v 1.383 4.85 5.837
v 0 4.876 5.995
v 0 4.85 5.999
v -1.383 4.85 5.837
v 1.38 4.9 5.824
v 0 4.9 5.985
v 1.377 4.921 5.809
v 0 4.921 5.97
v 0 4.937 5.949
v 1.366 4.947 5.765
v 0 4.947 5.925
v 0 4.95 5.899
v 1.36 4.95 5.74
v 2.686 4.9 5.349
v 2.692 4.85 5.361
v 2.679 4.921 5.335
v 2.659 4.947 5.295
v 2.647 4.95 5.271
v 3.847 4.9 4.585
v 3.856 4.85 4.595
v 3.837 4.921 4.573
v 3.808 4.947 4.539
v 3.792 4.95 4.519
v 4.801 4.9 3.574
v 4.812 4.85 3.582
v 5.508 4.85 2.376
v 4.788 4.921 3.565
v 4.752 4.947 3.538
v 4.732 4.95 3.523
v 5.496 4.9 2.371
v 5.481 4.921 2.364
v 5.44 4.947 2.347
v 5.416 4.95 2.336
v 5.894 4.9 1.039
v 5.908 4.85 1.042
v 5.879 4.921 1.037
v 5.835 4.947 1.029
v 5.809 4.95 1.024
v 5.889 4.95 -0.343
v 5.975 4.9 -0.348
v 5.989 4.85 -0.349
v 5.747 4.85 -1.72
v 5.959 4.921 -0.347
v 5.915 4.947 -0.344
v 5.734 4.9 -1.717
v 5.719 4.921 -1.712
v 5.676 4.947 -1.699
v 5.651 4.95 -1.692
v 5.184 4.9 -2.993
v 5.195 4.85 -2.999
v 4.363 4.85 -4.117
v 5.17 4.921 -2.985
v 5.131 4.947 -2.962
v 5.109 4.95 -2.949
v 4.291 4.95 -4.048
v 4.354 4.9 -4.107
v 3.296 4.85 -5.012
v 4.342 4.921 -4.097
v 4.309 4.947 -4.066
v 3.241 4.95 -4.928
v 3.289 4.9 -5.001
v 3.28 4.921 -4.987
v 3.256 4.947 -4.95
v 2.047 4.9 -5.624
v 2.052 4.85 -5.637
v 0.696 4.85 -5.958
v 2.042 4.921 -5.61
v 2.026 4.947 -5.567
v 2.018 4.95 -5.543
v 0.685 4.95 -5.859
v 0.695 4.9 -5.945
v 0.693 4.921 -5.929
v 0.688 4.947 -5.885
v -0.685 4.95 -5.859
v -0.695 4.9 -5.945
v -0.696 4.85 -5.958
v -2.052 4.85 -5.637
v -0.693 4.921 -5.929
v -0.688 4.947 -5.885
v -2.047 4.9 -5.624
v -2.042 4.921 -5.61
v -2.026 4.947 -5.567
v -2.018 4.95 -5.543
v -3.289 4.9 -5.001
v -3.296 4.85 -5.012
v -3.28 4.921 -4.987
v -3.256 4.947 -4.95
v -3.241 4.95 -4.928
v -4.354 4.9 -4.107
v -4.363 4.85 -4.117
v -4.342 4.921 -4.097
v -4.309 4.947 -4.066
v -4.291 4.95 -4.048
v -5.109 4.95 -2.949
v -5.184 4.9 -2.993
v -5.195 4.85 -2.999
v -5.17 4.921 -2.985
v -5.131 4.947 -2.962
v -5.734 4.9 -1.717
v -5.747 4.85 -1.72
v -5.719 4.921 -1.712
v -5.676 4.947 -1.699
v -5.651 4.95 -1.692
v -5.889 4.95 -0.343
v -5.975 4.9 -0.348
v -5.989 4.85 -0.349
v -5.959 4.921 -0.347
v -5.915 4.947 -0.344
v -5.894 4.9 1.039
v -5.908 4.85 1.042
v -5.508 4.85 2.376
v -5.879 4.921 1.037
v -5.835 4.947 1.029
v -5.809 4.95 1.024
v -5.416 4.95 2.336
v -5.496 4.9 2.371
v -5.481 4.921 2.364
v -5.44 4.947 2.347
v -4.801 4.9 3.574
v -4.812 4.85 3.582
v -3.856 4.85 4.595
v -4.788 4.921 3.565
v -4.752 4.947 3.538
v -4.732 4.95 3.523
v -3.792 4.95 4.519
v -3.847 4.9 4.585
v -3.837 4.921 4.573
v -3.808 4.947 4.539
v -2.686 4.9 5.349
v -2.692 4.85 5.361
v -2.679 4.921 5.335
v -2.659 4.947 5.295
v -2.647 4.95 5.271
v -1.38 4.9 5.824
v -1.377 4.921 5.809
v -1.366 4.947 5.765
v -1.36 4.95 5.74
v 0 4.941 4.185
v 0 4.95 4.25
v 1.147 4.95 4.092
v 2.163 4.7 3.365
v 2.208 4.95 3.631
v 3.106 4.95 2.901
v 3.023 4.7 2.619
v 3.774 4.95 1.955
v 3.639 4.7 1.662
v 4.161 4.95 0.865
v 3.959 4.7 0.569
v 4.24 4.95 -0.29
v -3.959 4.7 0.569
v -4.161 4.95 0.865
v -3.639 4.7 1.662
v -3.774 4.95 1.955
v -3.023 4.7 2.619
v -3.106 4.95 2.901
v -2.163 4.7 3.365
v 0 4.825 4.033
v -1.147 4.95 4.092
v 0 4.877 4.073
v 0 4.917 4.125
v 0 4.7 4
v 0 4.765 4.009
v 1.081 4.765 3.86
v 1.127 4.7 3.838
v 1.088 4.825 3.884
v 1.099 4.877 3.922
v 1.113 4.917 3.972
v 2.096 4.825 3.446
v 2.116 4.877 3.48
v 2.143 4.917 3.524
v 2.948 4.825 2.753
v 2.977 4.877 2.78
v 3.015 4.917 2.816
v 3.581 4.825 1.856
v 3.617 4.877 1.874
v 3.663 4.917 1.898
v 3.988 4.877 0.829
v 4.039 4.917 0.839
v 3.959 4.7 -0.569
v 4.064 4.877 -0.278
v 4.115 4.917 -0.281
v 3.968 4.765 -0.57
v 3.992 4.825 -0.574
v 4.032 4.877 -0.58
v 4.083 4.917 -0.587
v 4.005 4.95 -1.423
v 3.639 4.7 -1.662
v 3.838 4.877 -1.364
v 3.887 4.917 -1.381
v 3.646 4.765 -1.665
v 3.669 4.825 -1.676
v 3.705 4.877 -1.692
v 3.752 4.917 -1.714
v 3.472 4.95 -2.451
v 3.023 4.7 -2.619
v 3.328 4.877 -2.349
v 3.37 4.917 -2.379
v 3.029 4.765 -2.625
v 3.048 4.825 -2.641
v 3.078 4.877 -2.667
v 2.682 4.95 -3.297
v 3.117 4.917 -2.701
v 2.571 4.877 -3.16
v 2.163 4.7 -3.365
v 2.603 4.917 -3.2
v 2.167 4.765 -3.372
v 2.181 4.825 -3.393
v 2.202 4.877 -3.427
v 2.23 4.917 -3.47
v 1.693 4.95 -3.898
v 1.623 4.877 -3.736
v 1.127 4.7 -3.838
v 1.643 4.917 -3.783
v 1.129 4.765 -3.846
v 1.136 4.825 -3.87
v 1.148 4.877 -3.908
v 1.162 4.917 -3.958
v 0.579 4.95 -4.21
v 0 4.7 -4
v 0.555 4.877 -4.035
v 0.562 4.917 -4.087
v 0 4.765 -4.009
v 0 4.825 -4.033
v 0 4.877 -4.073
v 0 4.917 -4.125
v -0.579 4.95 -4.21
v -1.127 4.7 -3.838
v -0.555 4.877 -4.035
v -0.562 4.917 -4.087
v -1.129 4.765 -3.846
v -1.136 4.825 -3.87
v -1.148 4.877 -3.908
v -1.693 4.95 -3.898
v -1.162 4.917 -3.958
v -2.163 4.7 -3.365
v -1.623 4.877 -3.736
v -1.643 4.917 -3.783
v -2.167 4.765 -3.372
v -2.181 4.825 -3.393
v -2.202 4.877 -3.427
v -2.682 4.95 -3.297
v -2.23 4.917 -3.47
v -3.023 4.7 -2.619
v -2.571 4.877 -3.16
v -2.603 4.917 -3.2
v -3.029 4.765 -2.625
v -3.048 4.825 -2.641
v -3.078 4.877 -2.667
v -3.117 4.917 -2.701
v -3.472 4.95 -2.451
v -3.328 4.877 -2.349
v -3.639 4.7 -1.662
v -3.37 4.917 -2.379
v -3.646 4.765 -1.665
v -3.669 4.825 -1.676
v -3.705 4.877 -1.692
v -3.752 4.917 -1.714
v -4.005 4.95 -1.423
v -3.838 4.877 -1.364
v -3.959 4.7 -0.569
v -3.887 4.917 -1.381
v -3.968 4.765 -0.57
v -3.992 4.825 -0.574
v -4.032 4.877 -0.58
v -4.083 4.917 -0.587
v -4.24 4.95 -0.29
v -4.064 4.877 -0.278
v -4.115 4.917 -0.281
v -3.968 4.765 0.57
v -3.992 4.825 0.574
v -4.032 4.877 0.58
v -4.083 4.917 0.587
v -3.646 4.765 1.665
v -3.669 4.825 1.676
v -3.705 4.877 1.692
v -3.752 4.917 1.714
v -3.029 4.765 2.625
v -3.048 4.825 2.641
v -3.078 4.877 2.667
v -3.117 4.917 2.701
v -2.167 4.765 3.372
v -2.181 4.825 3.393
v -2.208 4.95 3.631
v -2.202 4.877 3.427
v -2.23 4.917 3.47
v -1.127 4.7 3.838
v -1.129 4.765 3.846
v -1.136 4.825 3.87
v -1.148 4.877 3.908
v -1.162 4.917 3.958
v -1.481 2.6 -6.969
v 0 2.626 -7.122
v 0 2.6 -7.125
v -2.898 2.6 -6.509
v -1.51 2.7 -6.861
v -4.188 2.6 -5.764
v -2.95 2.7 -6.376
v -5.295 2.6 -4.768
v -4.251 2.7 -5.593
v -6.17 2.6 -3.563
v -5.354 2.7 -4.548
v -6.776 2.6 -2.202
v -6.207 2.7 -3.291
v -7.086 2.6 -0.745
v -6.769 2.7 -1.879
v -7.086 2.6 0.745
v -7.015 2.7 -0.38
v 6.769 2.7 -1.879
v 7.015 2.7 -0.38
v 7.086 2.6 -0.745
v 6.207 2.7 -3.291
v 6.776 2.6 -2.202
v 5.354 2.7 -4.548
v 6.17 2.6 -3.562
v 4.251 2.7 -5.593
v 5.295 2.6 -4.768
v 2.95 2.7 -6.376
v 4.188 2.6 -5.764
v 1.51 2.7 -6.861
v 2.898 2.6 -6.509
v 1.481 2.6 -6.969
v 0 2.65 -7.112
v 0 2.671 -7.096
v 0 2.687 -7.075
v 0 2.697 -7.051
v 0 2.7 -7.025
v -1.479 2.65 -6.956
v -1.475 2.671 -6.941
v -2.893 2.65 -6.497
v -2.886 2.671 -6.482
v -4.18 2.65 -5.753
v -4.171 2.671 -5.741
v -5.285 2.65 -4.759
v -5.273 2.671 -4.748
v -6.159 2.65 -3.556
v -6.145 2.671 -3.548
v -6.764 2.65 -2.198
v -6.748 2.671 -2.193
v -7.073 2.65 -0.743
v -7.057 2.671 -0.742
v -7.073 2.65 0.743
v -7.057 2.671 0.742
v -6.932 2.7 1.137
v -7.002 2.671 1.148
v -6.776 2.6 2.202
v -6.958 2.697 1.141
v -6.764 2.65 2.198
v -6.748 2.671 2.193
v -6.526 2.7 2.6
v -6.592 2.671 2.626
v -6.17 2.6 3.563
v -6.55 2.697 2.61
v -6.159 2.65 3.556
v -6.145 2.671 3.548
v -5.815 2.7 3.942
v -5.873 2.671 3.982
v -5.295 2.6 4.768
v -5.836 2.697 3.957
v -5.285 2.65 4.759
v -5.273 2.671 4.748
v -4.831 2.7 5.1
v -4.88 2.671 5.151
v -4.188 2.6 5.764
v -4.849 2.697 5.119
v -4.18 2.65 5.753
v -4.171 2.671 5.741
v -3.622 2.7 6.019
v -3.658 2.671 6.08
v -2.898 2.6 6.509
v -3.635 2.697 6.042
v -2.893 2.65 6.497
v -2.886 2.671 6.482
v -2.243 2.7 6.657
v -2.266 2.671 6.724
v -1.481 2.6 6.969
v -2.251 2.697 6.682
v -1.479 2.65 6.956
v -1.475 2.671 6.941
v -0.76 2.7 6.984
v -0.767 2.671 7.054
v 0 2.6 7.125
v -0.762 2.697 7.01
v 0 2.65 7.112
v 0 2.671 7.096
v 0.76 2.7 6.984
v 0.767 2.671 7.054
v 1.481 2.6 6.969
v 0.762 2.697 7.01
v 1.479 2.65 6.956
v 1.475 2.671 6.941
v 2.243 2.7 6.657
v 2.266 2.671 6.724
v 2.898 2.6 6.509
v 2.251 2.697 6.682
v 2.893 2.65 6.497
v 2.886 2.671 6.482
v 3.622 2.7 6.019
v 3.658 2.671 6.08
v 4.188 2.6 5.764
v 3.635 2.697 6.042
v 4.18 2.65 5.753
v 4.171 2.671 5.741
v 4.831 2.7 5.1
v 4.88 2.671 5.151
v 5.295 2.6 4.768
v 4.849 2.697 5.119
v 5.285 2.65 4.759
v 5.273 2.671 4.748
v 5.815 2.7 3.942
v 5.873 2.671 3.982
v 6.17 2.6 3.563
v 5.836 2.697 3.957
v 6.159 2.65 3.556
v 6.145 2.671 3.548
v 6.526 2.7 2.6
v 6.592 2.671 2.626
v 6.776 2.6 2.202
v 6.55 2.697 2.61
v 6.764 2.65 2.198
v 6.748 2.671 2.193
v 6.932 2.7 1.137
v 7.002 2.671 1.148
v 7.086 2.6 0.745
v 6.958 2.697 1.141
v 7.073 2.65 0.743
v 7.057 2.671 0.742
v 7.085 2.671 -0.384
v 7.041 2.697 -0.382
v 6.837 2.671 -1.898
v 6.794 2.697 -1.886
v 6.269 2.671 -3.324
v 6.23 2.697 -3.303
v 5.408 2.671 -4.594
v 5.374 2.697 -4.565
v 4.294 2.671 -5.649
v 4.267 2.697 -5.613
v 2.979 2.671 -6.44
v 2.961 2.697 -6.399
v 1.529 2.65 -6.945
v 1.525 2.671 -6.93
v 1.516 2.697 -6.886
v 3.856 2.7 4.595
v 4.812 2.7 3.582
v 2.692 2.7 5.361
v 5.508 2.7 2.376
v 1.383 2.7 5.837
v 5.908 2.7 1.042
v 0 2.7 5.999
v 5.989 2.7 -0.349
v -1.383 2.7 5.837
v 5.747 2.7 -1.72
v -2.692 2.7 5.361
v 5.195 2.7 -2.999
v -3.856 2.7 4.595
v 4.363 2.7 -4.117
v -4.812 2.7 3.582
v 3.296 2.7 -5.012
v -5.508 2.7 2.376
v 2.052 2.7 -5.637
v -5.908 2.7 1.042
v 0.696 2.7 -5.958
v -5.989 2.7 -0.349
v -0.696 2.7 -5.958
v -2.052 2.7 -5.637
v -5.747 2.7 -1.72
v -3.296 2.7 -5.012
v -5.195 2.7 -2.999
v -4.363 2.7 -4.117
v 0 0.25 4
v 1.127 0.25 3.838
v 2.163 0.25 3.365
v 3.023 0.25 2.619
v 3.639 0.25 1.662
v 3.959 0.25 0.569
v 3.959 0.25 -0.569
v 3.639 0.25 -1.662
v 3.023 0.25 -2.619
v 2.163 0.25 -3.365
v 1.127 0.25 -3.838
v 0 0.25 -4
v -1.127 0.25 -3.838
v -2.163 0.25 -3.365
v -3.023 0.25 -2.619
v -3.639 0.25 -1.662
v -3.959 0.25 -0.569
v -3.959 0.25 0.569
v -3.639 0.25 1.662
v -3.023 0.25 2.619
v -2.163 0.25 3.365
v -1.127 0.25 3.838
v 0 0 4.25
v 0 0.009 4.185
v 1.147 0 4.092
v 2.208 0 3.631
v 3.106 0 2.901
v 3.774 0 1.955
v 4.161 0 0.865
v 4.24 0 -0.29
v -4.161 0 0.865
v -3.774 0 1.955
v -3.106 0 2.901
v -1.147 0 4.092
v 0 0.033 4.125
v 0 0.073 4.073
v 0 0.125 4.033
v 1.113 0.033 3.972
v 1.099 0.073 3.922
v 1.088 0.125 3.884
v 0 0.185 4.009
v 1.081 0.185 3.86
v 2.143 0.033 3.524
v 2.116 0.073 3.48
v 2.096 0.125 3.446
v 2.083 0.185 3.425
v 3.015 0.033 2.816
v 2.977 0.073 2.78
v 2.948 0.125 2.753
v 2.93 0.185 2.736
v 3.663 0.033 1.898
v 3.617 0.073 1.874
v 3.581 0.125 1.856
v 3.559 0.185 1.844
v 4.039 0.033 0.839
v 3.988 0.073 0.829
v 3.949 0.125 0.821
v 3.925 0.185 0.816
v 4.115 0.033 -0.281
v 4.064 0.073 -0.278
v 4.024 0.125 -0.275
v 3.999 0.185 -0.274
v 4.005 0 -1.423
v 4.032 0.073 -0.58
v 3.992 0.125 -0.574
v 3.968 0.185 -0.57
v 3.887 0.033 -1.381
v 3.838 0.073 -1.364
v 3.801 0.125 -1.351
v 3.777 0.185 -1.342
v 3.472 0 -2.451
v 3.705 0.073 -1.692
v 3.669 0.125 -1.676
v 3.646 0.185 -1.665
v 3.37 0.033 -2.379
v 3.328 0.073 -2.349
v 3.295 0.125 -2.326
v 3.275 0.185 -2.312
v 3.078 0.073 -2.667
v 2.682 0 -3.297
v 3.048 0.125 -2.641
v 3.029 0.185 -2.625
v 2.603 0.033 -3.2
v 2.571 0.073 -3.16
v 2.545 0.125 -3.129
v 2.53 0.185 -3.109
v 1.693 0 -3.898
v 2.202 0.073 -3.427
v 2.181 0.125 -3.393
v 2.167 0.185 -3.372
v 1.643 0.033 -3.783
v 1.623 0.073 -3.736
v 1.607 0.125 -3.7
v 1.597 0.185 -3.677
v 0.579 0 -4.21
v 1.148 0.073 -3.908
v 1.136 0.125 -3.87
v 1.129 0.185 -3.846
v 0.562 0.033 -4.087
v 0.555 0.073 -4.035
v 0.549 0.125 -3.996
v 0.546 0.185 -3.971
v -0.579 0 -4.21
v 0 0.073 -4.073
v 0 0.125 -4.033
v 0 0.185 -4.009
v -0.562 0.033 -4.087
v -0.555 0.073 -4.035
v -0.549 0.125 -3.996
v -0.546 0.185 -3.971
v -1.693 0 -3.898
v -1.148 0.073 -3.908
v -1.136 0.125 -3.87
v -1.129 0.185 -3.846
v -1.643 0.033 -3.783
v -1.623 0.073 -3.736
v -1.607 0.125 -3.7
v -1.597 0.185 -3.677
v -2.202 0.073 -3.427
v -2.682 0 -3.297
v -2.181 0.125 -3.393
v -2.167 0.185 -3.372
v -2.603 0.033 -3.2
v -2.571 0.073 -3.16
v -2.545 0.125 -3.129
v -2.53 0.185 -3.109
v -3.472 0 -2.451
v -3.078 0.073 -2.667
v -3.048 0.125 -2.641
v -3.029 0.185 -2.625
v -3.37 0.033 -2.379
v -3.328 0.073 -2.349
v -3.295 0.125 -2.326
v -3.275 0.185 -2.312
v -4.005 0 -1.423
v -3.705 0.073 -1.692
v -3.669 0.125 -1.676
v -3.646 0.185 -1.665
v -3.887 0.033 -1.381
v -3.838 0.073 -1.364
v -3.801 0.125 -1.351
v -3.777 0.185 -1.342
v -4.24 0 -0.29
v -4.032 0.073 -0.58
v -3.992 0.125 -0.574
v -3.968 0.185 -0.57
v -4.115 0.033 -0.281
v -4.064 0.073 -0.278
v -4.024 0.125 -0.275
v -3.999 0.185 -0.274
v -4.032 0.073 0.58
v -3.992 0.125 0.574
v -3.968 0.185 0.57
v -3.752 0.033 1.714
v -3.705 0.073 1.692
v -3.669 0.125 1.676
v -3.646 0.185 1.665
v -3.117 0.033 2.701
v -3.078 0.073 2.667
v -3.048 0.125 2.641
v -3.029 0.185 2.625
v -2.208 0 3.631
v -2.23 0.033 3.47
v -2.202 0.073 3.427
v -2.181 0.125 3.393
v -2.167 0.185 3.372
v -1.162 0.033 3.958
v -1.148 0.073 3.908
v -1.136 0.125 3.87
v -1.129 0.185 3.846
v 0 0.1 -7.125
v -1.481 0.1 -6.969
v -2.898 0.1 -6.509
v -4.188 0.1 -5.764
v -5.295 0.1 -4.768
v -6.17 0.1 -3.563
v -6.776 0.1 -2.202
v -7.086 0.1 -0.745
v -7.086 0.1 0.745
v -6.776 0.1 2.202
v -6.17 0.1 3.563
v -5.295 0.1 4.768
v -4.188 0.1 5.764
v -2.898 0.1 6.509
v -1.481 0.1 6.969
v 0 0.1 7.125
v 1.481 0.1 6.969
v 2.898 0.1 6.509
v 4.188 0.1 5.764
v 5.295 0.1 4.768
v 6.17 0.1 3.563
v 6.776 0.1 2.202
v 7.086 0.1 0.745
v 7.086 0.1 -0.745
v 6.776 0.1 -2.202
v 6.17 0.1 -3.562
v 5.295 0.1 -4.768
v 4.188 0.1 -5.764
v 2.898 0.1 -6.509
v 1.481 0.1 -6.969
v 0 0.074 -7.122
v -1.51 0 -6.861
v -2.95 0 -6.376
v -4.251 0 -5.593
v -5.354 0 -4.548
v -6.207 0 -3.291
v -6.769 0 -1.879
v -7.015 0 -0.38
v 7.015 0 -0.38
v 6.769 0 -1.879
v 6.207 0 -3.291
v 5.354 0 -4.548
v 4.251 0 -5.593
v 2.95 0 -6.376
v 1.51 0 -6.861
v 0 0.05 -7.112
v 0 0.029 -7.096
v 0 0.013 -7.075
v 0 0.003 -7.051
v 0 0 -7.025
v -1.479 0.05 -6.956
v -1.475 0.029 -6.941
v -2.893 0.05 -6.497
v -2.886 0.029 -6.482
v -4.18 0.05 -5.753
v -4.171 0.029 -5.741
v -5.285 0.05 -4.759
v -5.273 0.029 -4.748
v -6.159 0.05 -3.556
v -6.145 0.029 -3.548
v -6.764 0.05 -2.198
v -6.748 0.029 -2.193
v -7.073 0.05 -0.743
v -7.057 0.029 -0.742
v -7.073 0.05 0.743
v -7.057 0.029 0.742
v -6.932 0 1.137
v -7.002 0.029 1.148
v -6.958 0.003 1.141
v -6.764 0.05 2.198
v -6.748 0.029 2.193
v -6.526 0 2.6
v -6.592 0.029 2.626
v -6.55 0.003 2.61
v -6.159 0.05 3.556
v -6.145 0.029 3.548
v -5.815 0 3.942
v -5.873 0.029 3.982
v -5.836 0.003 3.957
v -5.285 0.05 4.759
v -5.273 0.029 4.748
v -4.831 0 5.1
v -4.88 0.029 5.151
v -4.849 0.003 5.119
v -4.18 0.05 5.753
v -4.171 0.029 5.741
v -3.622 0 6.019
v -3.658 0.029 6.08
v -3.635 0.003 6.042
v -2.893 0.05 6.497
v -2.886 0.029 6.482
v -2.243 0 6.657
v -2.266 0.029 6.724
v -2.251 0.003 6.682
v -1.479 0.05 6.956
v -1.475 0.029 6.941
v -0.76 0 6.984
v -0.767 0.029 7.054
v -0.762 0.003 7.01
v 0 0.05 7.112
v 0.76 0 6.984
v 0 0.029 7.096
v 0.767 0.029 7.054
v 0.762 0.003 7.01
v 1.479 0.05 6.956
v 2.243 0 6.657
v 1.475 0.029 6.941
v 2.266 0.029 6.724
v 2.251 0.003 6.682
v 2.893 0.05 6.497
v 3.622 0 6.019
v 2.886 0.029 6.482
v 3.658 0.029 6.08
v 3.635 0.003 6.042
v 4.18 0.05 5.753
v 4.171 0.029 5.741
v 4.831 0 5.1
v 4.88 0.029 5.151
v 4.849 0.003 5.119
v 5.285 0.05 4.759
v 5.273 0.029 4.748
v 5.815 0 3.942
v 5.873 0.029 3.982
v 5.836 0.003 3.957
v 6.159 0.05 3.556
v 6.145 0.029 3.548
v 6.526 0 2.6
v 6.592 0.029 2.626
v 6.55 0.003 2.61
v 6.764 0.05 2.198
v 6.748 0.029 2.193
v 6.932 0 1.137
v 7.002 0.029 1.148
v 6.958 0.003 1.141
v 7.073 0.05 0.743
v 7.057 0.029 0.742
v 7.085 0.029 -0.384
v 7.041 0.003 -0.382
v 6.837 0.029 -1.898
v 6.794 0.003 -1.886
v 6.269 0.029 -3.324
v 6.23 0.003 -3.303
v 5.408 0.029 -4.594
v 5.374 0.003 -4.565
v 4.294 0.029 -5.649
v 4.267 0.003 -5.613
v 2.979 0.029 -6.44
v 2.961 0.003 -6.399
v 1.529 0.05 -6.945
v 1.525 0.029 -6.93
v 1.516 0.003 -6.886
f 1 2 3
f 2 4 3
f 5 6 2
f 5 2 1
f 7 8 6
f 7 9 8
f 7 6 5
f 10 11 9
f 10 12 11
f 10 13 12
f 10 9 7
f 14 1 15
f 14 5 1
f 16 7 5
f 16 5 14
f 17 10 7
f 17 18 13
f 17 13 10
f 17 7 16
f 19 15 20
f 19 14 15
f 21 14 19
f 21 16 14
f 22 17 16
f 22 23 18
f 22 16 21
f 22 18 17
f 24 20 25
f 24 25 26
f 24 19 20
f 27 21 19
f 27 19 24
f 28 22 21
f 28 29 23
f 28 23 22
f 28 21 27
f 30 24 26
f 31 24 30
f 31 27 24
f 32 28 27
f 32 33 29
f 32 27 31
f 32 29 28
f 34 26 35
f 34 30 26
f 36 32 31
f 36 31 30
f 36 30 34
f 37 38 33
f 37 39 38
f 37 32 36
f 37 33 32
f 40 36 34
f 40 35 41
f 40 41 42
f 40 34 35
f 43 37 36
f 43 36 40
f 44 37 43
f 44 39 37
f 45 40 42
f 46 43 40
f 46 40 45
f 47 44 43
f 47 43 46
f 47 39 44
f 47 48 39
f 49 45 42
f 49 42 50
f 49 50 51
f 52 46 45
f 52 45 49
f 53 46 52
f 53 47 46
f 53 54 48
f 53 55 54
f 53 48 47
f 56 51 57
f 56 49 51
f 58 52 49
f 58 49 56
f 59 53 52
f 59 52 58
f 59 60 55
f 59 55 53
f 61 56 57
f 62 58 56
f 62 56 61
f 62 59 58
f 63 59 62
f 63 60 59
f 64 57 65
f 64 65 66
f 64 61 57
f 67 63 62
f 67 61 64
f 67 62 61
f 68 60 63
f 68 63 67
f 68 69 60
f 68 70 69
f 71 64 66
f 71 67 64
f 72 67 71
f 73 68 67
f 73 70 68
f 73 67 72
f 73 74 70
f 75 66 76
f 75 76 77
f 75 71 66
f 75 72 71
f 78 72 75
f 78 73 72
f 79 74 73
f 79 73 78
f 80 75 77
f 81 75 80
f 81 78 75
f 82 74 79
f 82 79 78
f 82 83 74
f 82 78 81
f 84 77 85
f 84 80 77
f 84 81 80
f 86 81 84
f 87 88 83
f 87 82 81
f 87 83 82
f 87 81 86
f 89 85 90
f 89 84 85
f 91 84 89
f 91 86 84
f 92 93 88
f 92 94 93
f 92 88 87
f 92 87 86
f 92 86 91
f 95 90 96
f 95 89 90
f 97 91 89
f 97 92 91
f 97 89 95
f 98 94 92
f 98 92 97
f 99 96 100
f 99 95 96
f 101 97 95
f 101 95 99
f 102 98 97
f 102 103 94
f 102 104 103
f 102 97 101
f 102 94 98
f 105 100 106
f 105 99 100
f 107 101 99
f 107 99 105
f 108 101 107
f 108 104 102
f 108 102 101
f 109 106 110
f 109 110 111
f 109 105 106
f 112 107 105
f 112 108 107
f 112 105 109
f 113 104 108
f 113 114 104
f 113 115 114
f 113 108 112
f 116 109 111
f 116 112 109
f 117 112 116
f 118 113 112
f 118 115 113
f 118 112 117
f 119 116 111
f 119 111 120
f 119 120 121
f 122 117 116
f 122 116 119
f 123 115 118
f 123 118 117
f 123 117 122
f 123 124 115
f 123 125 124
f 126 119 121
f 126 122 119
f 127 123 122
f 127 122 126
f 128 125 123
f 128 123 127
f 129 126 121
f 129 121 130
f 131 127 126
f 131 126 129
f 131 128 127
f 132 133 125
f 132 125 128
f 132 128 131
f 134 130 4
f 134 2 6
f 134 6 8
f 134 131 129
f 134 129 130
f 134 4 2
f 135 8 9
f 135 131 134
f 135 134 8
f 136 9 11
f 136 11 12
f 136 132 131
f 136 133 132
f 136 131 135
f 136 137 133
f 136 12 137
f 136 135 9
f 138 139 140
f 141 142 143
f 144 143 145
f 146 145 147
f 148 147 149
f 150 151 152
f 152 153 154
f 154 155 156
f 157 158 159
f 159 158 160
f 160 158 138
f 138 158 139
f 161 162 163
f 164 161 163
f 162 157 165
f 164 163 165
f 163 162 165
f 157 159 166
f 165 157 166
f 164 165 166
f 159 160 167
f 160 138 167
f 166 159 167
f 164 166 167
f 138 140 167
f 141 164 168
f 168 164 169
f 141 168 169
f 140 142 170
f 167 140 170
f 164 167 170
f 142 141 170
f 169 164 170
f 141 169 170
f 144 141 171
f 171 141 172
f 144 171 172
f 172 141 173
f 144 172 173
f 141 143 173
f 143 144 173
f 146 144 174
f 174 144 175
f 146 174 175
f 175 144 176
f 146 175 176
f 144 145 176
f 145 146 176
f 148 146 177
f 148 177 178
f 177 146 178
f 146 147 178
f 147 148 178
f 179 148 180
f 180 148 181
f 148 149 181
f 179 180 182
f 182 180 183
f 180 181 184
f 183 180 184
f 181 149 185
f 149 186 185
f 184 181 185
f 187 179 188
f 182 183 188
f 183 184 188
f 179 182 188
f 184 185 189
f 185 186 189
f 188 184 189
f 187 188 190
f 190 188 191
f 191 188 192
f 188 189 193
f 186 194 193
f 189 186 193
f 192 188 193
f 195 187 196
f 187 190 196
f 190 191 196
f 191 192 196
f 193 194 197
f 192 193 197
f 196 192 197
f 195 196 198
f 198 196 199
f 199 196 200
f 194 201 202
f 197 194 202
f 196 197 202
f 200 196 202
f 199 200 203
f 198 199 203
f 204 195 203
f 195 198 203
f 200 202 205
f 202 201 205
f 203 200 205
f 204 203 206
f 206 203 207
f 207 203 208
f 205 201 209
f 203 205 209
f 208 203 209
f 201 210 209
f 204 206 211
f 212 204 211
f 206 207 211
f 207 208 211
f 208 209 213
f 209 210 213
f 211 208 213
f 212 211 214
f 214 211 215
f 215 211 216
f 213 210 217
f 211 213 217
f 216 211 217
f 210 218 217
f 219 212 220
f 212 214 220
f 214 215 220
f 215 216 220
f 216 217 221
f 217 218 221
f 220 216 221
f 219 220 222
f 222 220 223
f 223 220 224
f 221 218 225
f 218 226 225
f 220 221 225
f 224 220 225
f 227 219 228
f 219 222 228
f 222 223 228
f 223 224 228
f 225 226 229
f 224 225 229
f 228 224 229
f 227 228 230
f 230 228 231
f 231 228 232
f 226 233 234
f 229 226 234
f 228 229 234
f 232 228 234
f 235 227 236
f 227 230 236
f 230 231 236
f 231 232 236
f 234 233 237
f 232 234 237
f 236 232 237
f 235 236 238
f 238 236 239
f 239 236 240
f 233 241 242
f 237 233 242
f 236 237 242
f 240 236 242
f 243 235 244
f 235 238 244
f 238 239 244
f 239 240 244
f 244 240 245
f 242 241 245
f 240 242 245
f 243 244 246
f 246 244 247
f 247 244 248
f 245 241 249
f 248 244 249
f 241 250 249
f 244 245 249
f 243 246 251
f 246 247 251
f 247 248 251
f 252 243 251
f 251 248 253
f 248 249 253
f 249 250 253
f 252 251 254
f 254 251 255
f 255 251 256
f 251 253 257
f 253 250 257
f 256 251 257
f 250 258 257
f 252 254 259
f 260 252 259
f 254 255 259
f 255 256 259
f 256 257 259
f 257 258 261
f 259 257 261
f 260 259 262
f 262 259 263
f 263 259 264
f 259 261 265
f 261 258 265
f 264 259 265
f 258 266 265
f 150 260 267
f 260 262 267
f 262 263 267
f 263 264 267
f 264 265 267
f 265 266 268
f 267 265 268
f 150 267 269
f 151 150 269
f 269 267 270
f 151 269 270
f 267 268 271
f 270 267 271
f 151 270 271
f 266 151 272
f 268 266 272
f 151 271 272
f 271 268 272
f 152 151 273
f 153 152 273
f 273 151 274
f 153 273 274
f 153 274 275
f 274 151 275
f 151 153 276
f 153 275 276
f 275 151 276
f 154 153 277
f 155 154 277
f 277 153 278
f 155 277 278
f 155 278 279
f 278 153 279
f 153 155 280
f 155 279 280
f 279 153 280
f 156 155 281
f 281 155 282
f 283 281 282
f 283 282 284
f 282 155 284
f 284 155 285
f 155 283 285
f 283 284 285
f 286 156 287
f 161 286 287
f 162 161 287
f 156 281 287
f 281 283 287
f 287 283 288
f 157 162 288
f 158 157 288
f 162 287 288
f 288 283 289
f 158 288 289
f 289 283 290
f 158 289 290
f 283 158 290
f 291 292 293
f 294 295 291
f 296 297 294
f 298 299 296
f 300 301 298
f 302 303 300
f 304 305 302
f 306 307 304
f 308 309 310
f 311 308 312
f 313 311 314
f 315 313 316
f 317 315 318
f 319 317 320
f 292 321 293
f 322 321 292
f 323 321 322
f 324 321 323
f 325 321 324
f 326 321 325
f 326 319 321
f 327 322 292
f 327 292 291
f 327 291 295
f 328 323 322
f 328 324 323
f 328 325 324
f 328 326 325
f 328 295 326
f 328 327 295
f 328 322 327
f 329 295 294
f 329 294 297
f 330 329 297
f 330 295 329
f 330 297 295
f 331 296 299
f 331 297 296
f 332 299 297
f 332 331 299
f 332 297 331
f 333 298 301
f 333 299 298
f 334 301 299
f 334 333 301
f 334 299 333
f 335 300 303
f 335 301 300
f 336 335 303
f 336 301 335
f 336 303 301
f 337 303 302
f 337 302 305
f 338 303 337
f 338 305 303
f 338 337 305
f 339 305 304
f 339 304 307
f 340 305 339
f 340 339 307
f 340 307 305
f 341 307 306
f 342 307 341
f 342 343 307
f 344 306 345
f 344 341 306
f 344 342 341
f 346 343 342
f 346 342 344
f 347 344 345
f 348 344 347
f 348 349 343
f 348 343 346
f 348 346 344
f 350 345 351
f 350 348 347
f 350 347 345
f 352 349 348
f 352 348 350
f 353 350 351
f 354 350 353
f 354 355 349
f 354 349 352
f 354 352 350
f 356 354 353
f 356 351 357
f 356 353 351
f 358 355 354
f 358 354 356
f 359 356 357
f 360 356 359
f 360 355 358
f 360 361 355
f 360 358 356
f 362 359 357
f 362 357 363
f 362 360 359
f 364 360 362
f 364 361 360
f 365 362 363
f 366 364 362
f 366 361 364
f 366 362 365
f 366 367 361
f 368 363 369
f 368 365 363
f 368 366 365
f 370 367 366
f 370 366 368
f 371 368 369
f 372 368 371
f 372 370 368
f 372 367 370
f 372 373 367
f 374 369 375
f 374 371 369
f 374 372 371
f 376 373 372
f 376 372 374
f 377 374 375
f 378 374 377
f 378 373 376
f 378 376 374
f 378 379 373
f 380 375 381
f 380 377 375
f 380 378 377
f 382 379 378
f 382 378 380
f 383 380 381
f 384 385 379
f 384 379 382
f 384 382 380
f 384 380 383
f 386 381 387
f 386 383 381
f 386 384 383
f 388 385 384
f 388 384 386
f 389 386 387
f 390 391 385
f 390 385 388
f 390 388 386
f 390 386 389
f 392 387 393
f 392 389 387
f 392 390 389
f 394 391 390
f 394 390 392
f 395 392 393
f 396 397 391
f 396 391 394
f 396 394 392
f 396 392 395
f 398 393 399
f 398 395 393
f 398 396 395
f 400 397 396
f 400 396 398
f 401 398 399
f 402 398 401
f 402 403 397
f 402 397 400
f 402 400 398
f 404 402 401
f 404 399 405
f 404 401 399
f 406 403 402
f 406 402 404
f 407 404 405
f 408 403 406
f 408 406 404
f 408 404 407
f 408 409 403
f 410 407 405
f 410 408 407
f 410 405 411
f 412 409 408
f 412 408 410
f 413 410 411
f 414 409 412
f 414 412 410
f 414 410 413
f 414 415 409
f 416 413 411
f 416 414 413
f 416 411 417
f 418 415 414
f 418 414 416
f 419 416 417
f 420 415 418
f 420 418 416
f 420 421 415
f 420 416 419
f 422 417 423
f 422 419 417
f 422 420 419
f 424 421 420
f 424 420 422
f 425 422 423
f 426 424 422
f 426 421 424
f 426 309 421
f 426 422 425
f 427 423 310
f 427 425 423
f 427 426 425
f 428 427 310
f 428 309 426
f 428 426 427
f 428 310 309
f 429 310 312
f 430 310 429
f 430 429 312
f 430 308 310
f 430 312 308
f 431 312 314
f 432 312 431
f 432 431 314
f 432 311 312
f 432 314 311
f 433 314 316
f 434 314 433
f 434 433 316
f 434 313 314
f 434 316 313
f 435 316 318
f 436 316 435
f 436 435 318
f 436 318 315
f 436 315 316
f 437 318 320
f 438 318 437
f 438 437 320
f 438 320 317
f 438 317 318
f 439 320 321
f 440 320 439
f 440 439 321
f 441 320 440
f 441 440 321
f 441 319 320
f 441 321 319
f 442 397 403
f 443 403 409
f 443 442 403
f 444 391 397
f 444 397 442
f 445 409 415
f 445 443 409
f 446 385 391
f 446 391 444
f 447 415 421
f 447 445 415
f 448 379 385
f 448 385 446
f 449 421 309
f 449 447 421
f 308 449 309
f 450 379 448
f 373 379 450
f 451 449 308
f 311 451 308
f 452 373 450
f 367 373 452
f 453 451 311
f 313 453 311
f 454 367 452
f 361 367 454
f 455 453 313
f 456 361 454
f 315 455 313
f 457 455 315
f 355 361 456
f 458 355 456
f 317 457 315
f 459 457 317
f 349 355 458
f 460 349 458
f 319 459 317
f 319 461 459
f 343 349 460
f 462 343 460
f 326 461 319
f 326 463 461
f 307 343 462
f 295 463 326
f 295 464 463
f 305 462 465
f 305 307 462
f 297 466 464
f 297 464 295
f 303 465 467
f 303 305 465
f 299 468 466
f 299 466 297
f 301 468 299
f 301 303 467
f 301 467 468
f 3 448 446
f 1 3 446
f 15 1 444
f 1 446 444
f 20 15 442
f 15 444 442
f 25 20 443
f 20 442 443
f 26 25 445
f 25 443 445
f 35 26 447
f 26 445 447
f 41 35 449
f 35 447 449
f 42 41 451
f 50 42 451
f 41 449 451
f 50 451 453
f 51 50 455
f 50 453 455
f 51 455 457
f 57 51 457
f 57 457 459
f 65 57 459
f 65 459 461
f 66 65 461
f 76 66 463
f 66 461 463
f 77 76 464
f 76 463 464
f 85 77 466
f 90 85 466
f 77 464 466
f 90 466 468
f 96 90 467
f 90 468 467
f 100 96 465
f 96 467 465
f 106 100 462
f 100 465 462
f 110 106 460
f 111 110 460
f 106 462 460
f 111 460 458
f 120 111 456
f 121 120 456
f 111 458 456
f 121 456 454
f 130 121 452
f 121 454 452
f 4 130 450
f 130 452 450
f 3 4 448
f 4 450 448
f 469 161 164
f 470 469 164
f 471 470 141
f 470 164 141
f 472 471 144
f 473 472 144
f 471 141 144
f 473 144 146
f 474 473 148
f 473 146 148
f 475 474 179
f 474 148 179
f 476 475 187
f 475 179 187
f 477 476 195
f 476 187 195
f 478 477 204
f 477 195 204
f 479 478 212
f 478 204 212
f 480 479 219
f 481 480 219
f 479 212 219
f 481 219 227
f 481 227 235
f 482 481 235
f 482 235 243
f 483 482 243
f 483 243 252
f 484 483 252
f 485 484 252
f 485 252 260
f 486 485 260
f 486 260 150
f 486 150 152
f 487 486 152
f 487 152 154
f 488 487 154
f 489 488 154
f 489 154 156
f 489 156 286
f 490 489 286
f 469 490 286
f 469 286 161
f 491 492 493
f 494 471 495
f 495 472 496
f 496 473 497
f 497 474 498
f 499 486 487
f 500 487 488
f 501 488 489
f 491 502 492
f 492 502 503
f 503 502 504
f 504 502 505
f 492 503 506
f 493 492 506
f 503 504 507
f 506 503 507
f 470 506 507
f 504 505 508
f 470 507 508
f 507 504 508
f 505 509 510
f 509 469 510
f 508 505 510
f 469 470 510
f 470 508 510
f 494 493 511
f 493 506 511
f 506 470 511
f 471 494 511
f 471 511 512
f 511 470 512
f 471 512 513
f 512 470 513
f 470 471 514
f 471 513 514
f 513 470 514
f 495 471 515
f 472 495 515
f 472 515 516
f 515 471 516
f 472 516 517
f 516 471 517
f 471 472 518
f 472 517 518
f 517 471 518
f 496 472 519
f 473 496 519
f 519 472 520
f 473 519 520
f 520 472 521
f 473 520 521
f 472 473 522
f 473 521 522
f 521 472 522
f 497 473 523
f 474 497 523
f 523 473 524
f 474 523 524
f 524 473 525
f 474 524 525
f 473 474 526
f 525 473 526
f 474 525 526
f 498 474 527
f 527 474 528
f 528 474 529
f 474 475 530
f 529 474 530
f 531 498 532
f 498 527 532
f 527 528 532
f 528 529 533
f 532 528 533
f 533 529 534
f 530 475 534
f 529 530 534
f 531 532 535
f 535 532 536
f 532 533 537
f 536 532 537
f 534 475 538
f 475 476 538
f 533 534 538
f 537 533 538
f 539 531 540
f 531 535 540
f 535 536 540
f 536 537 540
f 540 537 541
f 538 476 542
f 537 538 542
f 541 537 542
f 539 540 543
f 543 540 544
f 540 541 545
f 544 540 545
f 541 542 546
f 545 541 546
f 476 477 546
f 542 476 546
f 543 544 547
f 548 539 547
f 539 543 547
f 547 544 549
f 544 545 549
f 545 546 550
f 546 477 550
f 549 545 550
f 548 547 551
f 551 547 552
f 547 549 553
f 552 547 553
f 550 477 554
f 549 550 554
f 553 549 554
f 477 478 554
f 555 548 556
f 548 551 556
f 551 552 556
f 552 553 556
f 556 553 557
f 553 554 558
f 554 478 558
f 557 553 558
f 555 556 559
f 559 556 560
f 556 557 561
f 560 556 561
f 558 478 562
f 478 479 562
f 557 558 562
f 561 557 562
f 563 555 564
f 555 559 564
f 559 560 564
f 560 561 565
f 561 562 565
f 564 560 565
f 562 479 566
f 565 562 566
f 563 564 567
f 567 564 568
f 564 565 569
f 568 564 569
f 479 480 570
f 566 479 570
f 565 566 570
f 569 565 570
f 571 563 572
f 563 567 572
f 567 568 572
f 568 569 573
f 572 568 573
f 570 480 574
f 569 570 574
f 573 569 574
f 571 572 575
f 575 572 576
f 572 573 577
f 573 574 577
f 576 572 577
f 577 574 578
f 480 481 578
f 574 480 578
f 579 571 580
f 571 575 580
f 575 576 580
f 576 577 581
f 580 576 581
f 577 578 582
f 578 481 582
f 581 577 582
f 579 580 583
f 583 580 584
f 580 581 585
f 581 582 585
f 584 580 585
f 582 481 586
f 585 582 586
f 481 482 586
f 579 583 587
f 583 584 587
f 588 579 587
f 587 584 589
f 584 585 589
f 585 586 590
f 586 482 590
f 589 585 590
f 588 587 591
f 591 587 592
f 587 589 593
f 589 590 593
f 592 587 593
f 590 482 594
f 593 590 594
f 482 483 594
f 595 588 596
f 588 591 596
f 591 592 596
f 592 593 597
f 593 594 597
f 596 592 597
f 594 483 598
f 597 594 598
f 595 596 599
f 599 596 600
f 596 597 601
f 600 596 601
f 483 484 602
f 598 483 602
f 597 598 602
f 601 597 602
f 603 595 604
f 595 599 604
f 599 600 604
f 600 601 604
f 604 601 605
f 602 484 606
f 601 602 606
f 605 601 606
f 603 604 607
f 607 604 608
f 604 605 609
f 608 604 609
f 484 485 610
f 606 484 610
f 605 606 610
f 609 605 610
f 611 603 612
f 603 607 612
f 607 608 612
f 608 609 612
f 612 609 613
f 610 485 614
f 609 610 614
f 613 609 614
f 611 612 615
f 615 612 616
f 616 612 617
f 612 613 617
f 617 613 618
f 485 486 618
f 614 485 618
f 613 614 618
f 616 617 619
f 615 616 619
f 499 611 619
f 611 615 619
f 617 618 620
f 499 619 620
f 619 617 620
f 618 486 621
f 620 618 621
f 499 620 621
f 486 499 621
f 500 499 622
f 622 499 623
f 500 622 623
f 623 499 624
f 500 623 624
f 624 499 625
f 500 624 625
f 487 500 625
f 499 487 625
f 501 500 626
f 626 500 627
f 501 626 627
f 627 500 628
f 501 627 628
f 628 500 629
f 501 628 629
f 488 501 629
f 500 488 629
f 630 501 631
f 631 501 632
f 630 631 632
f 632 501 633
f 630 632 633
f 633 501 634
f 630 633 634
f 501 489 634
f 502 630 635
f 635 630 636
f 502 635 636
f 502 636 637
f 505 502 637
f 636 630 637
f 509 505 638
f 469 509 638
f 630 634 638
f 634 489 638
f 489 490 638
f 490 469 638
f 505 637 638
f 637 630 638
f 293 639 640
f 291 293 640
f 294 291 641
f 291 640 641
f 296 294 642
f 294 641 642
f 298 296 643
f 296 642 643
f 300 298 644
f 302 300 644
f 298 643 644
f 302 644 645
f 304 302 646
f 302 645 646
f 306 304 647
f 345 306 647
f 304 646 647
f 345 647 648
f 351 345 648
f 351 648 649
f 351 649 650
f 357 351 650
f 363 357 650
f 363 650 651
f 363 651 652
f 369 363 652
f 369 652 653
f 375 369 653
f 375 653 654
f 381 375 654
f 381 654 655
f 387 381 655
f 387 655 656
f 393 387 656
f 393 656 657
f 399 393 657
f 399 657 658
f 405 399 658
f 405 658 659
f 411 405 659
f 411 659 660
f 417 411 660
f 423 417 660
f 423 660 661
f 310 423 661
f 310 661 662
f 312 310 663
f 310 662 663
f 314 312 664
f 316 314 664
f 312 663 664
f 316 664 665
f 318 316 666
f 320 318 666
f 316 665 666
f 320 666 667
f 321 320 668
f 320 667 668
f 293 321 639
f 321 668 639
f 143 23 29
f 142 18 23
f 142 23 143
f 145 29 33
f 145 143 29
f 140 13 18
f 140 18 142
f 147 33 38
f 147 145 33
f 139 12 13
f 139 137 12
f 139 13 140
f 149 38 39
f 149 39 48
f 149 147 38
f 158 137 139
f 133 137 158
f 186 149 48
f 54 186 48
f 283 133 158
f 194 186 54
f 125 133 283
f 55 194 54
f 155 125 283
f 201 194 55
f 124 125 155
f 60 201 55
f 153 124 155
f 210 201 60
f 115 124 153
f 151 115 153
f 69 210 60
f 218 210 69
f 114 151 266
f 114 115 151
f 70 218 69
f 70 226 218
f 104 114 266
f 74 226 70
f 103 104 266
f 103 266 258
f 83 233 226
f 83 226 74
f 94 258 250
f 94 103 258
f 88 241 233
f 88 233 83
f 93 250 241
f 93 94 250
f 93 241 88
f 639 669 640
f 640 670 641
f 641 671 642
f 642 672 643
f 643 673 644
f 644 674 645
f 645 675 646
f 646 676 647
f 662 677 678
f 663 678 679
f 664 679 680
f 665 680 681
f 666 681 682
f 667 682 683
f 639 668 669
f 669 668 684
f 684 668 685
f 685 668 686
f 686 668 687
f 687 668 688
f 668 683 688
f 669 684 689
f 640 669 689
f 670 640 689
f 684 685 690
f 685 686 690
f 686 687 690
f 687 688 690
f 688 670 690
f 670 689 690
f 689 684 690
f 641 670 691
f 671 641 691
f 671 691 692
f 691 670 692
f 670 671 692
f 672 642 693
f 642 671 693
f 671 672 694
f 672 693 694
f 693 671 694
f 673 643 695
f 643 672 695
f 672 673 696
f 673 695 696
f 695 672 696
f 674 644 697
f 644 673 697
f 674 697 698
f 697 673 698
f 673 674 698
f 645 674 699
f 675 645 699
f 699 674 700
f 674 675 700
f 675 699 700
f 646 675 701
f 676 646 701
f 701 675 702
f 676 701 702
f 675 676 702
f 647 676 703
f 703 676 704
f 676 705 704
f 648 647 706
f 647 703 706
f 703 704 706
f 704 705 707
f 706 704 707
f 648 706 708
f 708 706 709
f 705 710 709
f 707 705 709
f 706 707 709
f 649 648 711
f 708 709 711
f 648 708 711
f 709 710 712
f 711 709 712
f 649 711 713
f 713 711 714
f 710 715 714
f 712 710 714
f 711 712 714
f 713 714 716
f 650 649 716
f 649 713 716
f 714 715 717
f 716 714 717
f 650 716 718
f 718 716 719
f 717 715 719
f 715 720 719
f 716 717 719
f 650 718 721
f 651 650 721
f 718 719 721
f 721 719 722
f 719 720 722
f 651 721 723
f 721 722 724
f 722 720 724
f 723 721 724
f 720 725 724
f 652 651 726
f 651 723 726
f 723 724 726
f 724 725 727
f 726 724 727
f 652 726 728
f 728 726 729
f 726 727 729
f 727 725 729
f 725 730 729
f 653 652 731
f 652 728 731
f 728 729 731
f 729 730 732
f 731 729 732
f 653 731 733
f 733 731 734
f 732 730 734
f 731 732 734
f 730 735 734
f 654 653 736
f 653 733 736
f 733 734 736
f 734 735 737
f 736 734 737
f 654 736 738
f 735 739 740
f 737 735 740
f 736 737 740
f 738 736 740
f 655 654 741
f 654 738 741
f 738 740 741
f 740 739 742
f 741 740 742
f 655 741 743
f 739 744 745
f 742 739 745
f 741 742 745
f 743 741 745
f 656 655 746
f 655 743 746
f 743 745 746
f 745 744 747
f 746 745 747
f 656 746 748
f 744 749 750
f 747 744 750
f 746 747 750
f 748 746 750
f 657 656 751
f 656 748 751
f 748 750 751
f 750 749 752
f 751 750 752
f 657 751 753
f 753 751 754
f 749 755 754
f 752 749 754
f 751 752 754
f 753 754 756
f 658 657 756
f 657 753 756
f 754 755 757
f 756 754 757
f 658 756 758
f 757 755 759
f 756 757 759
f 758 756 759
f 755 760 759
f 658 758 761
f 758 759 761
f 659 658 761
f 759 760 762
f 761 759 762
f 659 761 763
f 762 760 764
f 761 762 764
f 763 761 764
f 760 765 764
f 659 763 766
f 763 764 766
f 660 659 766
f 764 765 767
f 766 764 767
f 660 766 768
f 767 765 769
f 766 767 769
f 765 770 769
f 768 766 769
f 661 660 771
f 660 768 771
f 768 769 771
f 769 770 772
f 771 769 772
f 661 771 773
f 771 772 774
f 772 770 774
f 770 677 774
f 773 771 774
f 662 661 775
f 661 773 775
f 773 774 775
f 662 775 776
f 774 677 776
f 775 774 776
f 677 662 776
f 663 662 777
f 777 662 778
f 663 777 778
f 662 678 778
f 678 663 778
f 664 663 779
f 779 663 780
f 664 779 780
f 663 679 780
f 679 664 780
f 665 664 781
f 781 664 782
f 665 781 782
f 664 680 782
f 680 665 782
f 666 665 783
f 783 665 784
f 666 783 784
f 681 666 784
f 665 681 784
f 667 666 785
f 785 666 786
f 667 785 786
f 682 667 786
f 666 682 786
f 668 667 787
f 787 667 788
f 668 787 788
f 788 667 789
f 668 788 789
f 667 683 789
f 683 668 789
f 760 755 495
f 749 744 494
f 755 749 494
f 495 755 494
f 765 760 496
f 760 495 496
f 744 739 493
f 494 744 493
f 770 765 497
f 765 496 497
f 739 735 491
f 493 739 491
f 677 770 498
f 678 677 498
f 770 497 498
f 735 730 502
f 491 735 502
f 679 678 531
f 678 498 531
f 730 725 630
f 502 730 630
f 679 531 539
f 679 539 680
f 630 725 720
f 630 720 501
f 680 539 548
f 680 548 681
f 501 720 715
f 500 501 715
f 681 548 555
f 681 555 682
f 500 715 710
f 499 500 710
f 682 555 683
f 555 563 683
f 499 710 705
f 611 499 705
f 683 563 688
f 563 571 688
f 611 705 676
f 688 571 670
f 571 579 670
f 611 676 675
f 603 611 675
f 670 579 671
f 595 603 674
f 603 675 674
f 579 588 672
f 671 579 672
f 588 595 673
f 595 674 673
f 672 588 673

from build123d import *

# Parameters (mm, degrees)
SKETCH1_R           = 7.125
BOSS_EXTRUDE1_DEPTH = 4.95
SKETCH2_R           = 4
CUT_EXTRUDE2_DEPTH  = 12.25
CUT_EXTRUDE3_START  = -2.25
SKETCH3_R           = 7.125
SKETCH3_R_2         = 5.998819533
CUT_EXTRUDE3_DEPTH  = 2.25
FILLET1_R           = 0.1
FILLET2_R           = 0.25


with BuildPart() as part:
    # Sketch1 → Boss-Extrude1 (new body)
    with BuildSketch(Plane(origin=(0, 0, 0), x_dir=(1, 0, 0), z_dir=(0, 1, 0))):
        with Locations(Location((0, 0, 0), (0, 0, 90))):
            Circle(SKETCH1_R)
    extrude(amount=BOSS_EXTRUDE1_DEPTH)

    # Sketch2 → Cut-Extrude2 (cut)
    with BuildSketch(Plane(origin=(0, 4.95, 0), x_dir=(1, 0, 0), z_dir=(0, 1, 0))):
        with Locations(Location((0, 0, 0), (0, 0, 270))):
            Circle(SKETCH2_R)
    extrude(amount=-CUT_EXTRUDE2_DEPTH, mode=Mode.SUBTRACT)

    # Sketch3 → Cut-Extrude3 (cut)
    with BuildSketch(Plane(origin=(0, 4.95, 0), x_dir=(1, 0, 0), z_dir=(0, 1, 0)).offset(CUT_EXTRUDE3_START)):
        with Locations(Location((0, 0, 0), (0, 0, 90))):
            Circle(SKETCH3_R)
        with Locations(Location((0, 0, 0), (0, 0, 270))):
            Circle(SKETCH3_R_2, mode=Mode.SUBTRACT)
    extrude(amount=CUT_EXTRUDE3_DEPTH, mode=Mode.SUBTRACT)

    # Fillet1
    fillet1_edges = [part.edges().sort_by_distance(p)[0] for p in [
        (0, 2.7, 7.125),
        (0, 4.95, -5.998819533),
        (0, 0, 7.125),
    ]]
    fillet(fillet1_edges, radius=FILLET1_R)

    # Fillet2
    fillet2_edges = [part.edges().sort_by_distance(p)[0] for p in [
        (0, 0, -4),
        (0, 4.95, -4),
    ]]
    fillet(fillet2_edges, radius=FILLET2_R)


solid = part.part
